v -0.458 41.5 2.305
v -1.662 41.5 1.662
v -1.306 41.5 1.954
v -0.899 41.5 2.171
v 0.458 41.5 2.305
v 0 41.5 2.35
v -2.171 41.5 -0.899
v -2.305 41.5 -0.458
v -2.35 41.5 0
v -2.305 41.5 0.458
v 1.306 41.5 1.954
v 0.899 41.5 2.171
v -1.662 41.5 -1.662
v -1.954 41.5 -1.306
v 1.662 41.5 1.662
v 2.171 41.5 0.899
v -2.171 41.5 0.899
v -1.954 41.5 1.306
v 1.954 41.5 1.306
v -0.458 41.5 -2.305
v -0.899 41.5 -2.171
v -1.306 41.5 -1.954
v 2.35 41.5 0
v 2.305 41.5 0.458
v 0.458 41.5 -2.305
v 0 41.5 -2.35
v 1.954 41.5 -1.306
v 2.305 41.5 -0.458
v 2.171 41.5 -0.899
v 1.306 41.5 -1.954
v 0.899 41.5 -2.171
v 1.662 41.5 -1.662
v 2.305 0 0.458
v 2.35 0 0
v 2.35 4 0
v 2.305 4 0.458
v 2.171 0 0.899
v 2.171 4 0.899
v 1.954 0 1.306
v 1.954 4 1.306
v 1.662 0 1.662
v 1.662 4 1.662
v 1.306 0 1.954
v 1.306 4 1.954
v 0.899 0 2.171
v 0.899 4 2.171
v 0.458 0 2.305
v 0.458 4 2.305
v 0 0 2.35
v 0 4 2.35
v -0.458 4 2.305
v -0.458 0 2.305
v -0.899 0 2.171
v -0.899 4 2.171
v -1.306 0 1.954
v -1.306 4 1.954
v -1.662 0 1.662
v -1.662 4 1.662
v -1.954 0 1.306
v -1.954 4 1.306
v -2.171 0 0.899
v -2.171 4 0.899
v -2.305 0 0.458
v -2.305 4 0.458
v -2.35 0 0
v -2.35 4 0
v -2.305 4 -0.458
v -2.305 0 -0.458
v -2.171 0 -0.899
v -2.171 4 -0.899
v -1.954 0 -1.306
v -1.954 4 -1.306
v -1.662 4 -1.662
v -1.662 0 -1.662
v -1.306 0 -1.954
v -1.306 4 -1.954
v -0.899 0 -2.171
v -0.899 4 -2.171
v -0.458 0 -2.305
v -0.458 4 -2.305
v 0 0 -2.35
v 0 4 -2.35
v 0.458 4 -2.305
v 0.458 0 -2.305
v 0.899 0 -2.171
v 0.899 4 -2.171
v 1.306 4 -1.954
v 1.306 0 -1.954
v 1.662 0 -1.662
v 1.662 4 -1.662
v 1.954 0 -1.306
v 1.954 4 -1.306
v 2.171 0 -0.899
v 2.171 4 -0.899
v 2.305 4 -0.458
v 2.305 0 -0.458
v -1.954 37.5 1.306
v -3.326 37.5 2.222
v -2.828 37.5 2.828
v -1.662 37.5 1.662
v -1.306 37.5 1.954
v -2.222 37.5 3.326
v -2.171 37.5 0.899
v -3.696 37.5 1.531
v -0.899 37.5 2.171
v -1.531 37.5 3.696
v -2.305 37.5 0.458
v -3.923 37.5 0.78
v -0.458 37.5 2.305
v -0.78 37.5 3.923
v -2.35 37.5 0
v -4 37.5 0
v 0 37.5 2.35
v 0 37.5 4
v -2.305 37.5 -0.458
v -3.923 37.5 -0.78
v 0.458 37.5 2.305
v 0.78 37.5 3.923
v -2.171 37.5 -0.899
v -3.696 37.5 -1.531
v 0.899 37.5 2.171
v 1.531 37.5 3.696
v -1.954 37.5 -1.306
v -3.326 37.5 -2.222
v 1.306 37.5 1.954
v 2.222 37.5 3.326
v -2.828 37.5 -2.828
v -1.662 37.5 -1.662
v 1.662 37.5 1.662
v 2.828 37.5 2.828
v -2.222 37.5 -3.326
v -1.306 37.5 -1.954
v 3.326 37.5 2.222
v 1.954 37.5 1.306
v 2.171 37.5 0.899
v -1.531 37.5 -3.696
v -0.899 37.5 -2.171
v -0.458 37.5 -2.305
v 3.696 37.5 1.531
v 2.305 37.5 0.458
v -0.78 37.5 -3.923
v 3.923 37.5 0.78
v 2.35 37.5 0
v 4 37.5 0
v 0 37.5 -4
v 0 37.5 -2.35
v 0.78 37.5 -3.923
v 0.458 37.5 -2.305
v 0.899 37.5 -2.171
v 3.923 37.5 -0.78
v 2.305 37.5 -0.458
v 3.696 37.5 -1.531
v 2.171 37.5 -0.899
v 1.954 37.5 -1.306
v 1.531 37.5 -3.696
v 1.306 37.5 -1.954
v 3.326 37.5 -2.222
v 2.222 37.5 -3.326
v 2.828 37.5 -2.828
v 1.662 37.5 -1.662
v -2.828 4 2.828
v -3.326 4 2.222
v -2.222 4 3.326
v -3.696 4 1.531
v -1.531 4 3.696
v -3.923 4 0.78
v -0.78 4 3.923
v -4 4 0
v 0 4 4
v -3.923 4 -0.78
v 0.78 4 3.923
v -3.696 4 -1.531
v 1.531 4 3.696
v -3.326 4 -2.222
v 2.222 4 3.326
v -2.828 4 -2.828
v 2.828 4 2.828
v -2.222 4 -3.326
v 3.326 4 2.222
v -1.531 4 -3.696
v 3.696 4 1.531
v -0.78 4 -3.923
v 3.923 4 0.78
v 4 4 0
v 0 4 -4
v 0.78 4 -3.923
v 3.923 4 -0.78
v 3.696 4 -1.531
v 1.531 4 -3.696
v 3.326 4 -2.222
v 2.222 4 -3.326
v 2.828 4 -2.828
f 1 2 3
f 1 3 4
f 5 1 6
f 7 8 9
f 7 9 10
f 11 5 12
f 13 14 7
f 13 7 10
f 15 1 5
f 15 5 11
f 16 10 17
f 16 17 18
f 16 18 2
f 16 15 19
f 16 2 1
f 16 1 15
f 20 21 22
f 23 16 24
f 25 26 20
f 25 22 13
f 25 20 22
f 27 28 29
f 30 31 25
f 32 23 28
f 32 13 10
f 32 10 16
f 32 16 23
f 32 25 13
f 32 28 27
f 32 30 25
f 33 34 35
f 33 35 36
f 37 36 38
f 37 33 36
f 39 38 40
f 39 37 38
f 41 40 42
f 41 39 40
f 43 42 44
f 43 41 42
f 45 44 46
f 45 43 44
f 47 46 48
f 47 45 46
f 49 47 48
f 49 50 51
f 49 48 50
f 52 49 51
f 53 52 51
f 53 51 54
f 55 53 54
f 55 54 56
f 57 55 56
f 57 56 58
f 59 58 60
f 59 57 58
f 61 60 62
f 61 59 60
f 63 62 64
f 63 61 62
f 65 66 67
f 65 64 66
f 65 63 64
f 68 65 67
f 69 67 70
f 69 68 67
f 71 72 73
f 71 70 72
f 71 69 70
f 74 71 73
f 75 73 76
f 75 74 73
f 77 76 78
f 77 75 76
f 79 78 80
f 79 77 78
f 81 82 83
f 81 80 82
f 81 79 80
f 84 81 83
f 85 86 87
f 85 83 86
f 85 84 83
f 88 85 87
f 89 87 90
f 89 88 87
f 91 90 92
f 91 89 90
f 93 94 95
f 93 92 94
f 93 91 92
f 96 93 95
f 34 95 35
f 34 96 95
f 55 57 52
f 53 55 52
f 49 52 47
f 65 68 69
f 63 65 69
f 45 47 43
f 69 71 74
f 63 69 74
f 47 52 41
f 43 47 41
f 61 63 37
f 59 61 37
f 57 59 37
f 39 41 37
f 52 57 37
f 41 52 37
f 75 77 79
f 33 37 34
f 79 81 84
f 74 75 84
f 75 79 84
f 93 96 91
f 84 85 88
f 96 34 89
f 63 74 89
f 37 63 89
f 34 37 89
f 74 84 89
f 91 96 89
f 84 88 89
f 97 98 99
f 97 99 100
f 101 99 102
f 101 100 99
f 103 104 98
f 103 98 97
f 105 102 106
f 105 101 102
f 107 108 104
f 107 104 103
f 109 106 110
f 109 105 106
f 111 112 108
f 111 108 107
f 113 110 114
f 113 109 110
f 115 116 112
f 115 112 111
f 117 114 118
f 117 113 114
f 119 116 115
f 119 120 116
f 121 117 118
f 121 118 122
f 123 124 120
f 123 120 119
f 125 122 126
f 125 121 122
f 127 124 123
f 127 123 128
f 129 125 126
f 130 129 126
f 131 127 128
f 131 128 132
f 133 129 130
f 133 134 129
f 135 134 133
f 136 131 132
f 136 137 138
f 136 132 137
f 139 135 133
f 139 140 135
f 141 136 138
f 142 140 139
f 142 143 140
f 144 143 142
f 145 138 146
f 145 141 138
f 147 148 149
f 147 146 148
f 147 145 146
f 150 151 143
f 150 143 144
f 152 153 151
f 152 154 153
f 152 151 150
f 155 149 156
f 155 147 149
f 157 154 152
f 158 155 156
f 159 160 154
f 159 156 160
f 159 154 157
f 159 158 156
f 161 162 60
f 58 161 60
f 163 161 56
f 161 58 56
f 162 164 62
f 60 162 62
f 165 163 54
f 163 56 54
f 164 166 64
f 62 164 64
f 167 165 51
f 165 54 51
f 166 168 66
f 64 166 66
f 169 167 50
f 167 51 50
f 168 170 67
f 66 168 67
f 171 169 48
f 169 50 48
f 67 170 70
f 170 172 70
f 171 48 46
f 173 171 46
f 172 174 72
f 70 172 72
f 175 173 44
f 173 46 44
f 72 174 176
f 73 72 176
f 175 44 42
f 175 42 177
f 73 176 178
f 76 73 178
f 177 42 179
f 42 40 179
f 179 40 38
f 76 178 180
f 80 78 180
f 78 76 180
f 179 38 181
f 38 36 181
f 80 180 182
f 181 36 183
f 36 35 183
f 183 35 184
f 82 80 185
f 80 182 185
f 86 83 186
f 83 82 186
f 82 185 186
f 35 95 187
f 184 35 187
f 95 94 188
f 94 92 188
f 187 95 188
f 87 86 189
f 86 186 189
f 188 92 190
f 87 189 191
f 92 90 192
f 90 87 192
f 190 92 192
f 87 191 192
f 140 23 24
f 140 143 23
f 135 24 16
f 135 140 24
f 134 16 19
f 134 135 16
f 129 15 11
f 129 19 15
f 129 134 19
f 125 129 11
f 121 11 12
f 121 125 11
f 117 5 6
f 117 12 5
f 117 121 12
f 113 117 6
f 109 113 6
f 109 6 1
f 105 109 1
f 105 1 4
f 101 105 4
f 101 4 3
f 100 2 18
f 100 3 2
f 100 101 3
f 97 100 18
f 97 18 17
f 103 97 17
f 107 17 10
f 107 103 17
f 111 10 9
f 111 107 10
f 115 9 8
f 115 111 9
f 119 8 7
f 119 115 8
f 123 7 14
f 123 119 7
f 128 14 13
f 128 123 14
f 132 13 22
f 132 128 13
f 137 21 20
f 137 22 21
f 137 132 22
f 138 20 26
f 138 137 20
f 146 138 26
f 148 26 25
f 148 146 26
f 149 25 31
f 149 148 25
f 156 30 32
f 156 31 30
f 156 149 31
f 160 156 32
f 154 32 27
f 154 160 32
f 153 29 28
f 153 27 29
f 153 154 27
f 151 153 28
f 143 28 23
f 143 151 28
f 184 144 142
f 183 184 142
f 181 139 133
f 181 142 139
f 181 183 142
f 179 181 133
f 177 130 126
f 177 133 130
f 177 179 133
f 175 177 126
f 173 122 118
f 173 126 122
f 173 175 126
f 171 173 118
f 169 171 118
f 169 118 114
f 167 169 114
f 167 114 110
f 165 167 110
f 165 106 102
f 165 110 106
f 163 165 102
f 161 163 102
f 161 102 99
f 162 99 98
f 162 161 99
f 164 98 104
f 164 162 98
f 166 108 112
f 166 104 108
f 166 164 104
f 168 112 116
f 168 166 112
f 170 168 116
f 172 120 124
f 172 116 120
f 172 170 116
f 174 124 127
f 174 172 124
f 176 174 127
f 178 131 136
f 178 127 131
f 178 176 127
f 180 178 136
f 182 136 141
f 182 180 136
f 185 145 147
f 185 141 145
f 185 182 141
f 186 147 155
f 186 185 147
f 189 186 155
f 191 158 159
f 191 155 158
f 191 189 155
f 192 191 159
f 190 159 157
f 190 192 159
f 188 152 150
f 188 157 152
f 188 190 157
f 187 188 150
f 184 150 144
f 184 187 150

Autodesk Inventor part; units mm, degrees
ref_plane "YZ Plane" through (0, 0, 0) normal (1, 0, 0) x (0, 1, 0)
ref_plane "XZ Plane" through (0, 0, 0) normal (0, 1, 0) x (-1, 0, 0)
ref_plane "XY Plane" through (0, 0, 0) normal (0, 0, 1) x (1, 0, 0)
sketch "Sketch1" plane through (0, 0, 0) normal (0, 0, 1) x (1, 0, 0)
  line L0 (0, 0) -> (0, 41.5)
  line L1 (0, 41.5) -> (2.35, 41.5)
  line L2 (2.35, 41.5) -> (2.35, 37.5)
  line L3 (2.35, 37.5) -> (4, 37.5)
  line L4 (4, 37.5) -> (4, 4)
  line L5 (4, 4) -> (2.35, 4)
  line L6 (2.35, 4) -> (2.35, 0)
  line L7 (2.35, 0) -> (0, 0)
  dimension "d0" = 33.5
  dimension "d1" = 8
  dimension "d2" = 4.7
  dimension "d3" = 4
  dimension "d4" = 4
revolve "Revolution1" add sketch "Sketch1" angle 360 about axis through (0, 0, 0) along (0, 1, 0)
properties part number "Pok Mk3 Support" material "ABS Plastic"
